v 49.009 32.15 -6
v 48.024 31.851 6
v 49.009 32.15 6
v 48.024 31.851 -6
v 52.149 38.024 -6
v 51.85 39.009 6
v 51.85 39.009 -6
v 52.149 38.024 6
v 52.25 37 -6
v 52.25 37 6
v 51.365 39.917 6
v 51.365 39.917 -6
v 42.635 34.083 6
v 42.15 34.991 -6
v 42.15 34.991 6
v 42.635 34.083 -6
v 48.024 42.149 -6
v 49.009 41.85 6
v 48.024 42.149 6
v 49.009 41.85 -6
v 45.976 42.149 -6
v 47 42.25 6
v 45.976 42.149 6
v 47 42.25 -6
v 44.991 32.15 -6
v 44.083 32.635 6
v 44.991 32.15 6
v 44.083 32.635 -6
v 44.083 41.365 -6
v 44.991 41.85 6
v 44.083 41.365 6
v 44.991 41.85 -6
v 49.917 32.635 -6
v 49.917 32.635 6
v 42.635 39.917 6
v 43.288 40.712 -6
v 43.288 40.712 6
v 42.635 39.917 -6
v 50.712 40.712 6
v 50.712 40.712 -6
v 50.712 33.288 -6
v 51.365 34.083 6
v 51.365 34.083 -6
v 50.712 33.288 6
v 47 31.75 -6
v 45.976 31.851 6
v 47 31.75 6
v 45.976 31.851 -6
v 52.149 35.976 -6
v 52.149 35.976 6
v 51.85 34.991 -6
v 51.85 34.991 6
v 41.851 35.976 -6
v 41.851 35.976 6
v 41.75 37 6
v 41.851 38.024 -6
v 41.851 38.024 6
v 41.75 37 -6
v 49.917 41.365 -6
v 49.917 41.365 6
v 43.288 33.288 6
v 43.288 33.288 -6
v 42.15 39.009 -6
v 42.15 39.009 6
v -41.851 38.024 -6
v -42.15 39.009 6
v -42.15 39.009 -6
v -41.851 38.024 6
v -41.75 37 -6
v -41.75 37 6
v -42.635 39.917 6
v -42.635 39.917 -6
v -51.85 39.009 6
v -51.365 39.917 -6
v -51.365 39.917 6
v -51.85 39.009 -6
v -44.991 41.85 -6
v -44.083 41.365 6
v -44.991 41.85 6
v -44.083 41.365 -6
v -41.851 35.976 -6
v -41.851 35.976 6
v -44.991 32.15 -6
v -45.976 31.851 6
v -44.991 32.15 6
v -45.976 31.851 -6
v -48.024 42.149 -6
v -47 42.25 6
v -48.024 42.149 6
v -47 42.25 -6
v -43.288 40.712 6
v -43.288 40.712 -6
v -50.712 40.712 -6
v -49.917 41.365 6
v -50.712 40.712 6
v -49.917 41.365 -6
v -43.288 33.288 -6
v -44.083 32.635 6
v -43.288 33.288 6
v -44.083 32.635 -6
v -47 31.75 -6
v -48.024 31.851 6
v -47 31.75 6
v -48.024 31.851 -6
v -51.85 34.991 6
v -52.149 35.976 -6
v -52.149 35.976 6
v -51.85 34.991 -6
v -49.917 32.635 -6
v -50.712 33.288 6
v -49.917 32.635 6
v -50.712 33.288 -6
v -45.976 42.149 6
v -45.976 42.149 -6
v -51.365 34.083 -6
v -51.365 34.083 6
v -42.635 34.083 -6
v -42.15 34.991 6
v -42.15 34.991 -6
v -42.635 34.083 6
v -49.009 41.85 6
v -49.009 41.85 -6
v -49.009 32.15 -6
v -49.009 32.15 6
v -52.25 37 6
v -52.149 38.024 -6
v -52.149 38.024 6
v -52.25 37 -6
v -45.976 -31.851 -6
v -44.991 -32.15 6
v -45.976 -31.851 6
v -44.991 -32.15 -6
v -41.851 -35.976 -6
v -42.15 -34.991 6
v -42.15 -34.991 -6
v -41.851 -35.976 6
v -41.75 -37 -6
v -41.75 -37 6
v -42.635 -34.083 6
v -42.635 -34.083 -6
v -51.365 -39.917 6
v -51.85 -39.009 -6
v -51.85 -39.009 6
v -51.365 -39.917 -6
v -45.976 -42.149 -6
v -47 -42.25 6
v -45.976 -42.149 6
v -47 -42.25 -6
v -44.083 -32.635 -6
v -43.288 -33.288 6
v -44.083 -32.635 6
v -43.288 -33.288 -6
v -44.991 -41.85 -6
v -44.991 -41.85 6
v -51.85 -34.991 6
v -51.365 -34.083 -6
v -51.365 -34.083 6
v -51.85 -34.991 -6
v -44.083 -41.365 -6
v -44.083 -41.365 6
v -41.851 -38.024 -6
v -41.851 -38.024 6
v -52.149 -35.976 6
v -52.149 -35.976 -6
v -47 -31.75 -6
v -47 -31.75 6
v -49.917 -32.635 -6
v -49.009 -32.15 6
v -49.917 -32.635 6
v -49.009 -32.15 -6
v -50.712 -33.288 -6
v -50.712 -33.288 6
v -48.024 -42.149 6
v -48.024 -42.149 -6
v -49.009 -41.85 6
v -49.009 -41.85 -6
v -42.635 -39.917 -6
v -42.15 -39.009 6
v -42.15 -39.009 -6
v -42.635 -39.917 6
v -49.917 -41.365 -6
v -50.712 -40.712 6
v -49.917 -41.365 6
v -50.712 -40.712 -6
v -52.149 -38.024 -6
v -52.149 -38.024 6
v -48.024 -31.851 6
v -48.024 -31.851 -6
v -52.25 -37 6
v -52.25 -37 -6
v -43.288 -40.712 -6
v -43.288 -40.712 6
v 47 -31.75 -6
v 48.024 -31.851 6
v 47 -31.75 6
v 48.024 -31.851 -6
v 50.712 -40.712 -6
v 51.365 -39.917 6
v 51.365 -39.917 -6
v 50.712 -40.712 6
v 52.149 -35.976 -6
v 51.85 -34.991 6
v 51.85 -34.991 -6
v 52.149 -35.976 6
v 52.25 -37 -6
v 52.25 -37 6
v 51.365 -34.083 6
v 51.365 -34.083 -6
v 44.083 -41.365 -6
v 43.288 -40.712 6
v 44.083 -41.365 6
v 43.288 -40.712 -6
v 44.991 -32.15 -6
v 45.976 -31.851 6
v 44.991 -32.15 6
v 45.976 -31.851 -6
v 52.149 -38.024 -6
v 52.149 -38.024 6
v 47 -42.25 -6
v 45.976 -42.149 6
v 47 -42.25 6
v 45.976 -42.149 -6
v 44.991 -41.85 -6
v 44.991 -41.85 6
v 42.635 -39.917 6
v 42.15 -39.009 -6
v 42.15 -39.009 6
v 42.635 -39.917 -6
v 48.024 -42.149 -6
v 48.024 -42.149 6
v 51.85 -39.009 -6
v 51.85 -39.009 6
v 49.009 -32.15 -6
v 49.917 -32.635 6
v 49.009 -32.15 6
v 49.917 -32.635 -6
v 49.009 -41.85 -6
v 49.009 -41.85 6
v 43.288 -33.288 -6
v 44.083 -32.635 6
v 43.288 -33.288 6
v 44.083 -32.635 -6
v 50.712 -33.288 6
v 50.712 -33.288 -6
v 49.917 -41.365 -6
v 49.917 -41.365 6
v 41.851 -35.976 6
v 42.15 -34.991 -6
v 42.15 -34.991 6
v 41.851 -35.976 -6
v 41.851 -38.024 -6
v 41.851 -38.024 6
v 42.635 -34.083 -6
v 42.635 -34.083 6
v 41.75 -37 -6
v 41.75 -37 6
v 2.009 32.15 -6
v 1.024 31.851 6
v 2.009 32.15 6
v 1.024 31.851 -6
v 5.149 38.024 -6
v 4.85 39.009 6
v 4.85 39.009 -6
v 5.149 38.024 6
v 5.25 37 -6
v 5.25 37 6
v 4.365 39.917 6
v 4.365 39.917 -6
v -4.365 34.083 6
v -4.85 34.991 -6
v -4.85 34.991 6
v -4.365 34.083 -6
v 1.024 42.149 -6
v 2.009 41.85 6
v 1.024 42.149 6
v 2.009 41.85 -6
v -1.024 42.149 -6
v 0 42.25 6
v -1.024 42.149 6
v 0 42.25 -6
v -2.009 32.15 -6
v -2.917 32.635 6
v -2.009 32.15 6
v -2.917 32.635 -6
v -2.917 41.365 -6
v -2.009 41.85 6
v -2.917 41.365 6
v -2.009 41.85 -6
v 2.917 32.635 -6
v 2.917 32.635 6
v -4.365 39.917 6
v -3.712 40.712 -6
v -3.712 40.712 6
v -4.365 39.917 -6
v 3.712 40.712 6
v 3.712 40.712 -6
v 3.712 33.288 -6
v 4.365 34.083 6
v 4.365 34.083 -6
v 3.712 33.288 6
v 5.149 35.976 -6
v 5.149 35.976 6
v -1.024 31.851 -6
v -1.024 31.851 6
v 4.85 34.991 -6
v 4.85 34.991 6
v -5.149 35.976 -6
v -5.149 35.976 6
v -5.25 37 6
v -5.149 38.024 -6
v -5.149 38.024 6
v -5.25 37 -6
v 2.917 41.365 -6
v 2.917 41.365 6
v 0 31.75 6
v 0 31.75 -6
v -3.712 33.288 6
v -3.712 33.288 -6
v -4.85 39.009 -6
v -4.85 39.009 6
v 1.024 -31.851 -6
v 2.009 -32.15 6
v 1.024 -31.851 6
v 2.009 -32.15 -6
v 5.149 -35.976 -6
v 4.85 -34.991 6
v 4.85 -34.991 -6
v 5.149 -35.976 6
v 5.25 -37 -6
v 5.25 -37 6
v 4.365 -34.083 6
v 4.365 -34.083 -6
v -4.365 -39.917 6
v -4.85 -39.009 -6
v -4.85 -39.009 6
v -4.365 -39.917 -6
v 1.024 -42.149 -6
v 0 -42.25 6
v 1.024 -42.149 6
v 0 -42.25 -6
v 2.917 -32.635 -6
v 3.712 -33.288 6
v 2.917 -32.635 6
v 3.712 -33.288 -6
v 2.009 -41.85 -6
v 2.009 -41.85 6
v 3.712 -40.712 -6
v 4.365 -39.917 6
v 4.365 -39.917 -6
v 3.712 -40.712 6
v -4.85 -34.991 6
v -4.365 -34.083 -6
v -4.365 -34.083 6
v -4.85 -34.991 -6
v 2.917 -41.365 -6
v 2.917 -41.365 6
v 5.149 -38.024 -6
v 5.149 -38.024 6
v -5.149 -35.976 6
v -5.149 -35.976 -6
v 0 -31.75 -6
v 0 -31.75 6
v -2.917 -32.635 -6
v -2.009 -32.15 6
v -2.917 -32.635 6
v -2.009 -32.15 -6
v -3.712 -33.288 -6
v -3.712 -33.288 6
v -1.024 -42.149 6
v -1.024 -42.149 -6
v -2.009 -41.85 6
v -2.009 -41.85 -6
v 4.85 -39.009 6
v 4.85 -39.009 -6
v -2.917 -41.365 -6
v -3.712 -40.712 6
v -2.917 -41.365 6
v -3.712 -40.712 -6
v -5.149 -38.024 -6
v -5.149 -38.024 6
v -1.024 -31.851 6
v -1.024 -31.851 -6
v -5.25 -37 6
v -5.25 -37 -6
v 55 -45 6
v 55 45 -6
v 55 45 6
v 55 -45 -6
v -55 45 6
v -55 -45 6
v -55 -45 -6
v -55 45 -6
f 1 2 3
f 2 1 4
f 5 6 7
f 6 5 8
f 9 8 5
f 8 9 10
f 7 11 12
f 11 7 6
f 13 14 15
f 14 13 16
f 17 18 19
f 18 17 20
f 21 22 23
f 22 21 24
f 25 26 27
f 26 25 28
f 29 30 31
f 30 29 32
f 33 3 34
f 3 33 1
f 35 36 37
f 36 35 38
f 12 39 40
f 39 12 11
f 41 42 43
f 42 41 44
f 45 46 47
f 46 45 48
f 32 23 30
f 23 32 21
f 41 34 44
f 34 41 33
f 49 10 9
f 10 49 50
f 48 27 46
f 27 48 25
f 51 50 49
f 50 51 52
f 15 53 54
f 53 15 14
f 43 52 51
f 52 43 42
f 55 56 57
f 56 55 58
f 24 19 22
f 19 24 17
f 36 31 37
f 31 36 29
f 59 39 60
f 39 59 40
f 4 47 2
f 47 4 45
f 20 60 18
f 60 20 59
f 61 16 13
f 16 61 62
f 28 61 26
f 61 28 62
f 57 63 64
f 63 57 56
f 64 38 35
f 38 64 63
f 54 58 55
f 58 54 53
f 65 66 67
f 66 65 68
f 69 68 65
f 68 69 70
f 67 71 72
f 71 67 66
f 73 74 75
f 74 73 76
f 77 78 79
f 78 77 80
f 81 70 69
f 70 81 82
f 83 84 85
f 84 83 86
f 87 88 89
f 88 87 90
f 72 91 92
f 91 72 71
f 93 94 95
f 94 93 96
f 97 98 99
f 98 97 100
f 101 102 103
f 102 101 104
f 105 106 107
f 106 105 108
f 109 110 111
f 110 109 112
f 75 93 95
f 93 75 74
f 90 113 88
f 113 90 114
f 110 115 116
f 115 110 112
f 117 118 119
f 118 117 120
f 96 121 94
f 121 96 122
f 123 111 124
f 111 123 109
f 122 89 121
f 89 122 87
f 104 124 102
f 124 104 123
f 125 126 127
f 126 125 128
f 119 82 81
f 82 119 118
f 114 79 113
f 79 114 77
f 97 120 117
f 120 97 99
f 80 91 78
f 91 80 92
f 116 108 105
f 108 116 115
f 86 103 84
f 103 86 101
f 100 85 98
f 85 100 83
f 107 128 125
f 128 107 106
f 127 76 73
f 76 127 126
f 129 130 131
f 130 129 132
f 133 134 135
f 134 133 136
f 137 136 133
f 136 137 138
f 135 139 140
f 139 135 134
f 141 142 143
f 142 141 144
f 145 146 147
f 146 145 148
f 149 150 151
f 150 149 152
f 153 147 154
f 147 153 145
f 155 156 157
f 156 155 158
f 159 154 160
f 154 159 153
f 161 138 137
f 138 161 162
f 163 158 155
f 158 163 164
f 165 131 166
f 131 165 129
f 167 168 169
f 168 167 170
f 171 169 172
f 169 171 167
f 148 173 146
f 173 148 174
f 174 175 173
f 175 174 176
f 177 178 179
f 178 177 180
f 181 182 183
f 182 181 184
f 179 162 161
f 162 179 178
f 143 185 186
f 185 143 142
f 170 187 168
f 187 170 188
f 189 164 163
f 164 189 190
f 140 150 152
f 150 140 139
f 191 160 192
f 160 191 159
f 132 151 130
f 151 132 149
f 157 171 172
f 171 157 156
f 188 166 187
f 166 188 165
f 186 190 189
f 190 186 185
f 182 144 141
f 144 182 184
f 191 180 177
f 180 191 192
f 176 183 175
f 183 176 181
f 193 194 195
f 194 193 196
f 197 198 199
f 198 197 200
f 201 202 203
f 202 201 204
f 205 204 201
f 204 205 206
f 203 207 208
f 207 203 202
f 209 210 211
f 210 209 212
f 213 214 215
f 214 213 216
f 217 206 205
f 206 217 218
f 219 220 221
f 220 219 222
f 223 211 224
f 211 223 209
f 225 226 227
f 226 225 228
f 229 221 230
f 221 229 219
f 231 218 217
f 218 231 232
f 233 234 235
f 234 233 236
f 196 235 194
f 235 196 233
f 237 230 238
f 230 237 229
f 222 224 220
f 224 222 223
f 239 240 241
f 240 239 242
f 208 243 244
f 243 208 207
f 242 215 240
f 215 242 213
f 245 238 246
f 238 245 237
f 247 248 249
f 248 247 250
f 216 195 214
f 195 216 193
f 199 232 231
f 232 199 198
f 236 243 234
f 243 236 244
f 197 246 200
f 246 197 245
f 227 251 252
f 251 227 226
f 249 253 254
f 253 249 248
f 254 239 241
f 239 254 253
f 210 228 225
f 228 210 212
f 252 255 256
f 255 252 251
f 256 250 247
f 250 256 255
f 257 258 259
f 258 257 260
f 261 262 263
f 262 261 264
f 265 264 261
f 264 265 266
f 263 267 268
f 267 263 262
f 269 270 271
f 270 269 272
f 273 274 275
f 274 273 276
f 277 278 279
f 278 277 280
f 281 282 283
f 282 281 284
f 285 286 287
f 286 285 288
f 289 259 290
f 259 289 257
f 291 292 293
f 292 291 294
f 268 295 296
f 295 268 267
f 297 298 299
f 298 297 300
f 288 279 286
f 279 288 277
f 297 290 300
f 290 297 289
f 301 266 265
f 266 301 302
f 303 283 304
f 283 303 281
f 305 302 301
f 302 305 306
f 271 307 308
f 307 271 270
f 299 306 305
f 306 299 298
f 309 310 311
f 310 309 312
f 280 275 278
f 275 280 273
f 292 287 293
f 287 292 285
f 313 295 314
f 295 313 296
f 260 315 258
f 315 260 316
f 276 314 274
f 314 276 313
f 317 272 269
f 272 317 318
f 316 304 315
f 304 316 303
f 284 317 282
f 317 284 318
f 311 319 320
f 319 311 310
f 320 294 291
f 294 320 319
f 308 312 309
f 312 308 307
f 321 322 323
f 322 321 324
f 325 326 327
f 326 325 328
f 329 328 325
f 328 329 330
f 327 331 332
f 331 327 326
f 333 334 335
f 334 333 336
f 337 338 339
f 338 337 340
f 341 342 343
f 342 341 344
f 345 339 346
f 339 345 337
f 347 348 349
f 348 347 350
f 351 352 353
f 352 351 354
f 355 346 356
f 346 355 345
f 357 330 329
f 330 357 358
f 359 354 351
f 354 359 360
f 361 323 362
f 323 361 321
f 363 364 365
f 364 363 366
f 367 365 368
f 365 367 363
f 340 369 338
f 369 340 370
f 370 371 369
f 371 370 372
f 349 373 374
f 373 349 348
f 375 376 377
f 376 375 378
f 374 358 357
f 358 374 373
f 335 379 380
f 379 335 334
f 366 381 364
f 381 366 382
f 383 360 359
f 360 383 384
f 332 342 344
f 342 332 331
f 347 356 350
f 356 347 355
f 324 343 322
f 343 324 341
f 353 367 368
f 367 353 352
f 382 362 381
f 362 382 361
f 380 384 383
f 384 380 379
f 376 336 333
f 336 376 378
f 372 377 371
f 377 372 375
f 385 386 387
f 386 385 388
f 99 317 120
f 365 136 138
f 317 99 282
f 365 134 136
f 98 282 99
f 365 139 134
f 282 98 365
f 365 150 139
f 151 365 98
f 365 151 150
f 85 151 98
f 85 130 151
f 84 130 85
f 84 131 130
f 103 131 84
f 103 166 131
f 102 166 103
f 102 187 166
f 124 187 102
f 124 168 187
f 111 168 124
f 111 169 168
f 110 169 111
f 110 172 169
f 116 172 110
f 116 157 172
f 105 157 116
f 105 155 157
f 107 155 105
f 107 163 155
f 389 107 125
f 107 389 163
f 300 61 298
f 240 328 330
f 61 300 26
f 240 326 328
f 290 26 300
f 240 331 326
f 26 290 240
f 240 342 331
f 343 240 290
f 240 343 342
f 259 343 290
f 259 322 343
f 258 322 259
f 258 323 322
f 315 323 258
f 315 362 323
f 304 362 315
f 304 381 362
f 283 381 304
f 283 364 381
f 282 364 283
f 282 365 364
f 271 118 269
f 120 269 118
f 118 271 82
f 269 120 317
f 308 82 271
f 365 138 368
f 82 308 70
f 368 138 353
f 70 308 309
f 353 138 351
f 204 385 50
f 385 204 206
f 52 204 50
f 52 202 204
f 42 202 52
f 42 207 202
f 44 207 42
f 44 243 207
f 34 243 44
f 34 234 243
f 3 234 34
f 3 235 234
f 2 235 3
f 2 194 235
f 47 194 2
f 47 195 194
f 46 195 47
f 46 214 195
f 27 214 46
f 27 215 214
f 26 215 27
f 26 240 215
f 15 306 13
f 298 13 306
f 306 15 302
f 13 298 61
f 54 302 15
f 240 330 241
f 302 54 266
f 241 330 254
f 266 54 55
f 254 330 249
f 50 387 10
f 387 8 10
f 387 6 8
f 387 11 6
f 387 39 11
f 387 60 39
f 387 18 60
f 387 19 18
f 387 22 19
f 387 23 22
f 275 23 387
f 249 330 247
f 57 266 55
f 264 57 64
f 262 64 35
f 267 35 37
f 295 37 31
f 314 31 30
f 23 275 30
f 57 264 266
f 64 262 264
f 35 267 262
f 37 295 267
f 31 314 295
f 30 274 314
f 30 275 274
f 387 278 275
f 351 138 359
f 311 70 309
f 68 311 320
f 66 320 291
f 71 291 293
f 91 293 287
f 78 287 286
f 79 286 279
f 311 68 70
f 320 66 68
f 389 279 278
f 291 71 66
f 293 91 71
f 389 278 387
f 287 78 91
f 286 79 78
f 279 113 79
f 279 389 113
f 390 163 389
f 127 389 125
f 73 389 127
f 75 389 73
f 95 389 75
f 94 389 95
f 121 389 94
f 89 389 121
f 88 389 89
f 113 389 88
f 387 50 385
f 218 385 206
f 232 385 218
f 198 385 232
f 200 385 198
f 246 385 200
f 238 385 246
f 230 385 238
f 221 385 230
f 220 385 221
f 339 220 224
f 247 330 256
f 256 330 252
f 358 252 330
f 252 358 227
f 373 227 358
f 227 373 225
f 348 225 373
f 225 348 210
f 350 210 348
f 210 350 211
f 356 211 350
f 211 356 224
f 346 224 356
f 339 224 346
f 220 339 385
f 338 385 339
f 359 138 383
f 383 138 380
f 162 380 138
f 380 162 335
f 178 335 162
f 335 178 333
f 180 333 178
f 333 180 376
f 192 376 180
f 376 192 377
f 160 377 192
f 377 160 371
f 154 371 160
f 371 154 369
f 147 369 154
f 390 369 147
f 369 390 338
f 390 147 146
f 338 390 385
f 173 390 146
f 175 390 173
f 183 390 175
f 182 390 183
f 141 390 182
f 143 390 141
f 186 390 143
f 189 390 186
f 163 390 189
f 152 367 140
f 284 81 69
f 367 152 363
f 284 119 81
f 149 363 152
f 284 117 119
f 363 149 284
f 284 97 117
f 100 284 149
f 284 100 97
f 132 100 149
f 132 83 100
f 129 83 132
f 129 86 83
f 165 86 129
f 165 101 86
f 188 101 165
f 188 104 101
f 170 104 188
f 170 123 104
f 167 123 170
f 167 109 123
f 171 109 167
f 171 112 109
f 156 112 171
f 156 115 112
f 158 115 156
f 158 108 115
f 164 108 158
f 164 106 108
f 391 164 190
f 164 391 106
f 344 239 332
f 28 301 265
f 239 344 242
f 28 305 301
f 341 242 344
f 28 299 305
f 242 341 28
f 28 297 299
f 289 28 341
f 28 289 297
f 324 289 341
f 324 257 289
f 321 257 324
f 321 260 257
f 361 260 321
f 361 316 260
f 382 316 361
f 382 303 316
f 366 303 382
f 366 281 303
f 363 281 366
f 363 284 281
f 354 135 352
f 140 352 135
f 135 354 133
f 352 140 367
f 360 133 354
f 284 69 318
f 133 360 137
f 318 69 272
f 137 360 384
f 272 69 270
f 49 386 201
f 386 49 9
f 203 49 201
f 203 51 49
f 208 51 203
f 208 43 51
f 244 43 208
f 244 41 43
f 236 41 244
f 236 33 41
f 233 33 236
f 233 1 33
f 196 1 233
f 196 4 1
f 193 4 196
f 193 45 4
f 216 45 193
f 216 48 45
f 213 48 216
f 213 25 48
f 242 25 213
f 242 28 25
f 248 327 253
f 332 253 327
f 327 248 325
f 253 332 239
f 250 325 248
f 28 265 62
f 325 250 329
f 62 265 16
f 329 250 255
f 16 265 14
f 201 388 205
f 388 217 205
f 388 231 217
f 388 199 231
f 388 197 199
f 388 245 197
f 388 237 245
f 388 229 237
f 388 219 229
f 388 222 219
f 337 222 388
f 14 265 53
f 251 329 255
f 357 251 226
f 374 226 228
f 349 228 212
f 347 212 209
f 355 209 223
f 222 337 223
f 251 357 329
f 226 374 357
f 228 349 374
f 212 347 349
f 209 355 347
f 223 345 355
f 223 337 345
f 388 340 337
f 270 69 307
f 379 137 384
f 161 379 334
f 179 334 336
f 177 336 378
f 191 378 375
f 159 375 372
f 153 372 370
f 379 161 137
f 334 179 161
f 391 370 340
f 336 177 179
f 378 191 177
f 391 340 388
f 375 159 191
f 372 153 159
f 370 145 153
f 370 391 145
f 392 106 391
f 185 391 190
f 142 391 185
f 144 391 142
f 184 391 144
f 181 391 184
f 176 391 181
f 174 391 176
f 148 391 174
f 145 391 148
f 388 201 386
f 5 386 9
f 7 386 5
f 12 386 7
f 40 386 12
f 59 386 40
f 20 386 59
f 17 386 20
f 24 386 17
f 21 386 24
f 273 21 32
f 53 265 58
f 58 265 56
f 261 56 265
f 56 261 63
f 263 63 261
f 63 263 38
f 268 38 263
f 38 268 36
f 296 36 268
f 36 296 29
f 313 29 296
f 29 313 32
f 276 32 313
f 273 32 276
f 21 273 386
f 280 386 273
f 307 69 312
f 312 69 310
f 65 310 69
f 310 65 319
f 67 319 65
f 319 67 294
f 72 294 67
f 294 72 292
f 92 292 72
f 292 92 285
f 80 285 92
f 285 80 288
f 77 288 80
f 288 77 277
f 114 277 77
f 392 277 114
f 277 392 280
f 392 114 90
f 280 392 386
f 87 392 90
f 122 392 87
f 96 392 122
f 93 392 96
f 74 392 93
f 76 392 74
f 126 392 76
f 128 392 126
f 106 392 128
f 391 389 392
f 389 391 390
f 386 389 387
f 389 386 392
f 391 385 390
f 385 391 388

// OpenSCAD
$fn = 32;

// ----------------------------------------------------------------------
// Corner plate 110 x 90 x 12
// 6 holes, centres taken from the edge offset
// ----------------------------------------------------------------------

// --- parameters (mm) ---
plate = [110, 90, 12];  // overall size (x, y, z)
holes = 6;              // number of holes the drawing asks for
hole_d = 10.5;          // hole diameter
edge = 8;               // hole centre offset from the plate edge

// --- derived feature positions (mm) ---
corner_x = plate[0] / 2 - edge;  // = 47   corner hole X
corner_y = plate[1] / 2 - edge;  // = 37   corner hole Y
feature_centers = [
  [corner_x, corner_y],
  [-corner_x, corner_y],
  [-corner_x, -corner_y],
  [corner_x, -corner_y],
  [0, corner_y],
  [0, -corner_y]
];   // hole centres the loop below drills

// plate outline, every hole drilled through with the same cutters
difference() {
  cube(plate, center = true);
  for (centre = feature_centers)
    translate([centre[0], centre[1], 0])
      cylinder(d = hole_d, h = plate[2] + 2, center = true);
}
